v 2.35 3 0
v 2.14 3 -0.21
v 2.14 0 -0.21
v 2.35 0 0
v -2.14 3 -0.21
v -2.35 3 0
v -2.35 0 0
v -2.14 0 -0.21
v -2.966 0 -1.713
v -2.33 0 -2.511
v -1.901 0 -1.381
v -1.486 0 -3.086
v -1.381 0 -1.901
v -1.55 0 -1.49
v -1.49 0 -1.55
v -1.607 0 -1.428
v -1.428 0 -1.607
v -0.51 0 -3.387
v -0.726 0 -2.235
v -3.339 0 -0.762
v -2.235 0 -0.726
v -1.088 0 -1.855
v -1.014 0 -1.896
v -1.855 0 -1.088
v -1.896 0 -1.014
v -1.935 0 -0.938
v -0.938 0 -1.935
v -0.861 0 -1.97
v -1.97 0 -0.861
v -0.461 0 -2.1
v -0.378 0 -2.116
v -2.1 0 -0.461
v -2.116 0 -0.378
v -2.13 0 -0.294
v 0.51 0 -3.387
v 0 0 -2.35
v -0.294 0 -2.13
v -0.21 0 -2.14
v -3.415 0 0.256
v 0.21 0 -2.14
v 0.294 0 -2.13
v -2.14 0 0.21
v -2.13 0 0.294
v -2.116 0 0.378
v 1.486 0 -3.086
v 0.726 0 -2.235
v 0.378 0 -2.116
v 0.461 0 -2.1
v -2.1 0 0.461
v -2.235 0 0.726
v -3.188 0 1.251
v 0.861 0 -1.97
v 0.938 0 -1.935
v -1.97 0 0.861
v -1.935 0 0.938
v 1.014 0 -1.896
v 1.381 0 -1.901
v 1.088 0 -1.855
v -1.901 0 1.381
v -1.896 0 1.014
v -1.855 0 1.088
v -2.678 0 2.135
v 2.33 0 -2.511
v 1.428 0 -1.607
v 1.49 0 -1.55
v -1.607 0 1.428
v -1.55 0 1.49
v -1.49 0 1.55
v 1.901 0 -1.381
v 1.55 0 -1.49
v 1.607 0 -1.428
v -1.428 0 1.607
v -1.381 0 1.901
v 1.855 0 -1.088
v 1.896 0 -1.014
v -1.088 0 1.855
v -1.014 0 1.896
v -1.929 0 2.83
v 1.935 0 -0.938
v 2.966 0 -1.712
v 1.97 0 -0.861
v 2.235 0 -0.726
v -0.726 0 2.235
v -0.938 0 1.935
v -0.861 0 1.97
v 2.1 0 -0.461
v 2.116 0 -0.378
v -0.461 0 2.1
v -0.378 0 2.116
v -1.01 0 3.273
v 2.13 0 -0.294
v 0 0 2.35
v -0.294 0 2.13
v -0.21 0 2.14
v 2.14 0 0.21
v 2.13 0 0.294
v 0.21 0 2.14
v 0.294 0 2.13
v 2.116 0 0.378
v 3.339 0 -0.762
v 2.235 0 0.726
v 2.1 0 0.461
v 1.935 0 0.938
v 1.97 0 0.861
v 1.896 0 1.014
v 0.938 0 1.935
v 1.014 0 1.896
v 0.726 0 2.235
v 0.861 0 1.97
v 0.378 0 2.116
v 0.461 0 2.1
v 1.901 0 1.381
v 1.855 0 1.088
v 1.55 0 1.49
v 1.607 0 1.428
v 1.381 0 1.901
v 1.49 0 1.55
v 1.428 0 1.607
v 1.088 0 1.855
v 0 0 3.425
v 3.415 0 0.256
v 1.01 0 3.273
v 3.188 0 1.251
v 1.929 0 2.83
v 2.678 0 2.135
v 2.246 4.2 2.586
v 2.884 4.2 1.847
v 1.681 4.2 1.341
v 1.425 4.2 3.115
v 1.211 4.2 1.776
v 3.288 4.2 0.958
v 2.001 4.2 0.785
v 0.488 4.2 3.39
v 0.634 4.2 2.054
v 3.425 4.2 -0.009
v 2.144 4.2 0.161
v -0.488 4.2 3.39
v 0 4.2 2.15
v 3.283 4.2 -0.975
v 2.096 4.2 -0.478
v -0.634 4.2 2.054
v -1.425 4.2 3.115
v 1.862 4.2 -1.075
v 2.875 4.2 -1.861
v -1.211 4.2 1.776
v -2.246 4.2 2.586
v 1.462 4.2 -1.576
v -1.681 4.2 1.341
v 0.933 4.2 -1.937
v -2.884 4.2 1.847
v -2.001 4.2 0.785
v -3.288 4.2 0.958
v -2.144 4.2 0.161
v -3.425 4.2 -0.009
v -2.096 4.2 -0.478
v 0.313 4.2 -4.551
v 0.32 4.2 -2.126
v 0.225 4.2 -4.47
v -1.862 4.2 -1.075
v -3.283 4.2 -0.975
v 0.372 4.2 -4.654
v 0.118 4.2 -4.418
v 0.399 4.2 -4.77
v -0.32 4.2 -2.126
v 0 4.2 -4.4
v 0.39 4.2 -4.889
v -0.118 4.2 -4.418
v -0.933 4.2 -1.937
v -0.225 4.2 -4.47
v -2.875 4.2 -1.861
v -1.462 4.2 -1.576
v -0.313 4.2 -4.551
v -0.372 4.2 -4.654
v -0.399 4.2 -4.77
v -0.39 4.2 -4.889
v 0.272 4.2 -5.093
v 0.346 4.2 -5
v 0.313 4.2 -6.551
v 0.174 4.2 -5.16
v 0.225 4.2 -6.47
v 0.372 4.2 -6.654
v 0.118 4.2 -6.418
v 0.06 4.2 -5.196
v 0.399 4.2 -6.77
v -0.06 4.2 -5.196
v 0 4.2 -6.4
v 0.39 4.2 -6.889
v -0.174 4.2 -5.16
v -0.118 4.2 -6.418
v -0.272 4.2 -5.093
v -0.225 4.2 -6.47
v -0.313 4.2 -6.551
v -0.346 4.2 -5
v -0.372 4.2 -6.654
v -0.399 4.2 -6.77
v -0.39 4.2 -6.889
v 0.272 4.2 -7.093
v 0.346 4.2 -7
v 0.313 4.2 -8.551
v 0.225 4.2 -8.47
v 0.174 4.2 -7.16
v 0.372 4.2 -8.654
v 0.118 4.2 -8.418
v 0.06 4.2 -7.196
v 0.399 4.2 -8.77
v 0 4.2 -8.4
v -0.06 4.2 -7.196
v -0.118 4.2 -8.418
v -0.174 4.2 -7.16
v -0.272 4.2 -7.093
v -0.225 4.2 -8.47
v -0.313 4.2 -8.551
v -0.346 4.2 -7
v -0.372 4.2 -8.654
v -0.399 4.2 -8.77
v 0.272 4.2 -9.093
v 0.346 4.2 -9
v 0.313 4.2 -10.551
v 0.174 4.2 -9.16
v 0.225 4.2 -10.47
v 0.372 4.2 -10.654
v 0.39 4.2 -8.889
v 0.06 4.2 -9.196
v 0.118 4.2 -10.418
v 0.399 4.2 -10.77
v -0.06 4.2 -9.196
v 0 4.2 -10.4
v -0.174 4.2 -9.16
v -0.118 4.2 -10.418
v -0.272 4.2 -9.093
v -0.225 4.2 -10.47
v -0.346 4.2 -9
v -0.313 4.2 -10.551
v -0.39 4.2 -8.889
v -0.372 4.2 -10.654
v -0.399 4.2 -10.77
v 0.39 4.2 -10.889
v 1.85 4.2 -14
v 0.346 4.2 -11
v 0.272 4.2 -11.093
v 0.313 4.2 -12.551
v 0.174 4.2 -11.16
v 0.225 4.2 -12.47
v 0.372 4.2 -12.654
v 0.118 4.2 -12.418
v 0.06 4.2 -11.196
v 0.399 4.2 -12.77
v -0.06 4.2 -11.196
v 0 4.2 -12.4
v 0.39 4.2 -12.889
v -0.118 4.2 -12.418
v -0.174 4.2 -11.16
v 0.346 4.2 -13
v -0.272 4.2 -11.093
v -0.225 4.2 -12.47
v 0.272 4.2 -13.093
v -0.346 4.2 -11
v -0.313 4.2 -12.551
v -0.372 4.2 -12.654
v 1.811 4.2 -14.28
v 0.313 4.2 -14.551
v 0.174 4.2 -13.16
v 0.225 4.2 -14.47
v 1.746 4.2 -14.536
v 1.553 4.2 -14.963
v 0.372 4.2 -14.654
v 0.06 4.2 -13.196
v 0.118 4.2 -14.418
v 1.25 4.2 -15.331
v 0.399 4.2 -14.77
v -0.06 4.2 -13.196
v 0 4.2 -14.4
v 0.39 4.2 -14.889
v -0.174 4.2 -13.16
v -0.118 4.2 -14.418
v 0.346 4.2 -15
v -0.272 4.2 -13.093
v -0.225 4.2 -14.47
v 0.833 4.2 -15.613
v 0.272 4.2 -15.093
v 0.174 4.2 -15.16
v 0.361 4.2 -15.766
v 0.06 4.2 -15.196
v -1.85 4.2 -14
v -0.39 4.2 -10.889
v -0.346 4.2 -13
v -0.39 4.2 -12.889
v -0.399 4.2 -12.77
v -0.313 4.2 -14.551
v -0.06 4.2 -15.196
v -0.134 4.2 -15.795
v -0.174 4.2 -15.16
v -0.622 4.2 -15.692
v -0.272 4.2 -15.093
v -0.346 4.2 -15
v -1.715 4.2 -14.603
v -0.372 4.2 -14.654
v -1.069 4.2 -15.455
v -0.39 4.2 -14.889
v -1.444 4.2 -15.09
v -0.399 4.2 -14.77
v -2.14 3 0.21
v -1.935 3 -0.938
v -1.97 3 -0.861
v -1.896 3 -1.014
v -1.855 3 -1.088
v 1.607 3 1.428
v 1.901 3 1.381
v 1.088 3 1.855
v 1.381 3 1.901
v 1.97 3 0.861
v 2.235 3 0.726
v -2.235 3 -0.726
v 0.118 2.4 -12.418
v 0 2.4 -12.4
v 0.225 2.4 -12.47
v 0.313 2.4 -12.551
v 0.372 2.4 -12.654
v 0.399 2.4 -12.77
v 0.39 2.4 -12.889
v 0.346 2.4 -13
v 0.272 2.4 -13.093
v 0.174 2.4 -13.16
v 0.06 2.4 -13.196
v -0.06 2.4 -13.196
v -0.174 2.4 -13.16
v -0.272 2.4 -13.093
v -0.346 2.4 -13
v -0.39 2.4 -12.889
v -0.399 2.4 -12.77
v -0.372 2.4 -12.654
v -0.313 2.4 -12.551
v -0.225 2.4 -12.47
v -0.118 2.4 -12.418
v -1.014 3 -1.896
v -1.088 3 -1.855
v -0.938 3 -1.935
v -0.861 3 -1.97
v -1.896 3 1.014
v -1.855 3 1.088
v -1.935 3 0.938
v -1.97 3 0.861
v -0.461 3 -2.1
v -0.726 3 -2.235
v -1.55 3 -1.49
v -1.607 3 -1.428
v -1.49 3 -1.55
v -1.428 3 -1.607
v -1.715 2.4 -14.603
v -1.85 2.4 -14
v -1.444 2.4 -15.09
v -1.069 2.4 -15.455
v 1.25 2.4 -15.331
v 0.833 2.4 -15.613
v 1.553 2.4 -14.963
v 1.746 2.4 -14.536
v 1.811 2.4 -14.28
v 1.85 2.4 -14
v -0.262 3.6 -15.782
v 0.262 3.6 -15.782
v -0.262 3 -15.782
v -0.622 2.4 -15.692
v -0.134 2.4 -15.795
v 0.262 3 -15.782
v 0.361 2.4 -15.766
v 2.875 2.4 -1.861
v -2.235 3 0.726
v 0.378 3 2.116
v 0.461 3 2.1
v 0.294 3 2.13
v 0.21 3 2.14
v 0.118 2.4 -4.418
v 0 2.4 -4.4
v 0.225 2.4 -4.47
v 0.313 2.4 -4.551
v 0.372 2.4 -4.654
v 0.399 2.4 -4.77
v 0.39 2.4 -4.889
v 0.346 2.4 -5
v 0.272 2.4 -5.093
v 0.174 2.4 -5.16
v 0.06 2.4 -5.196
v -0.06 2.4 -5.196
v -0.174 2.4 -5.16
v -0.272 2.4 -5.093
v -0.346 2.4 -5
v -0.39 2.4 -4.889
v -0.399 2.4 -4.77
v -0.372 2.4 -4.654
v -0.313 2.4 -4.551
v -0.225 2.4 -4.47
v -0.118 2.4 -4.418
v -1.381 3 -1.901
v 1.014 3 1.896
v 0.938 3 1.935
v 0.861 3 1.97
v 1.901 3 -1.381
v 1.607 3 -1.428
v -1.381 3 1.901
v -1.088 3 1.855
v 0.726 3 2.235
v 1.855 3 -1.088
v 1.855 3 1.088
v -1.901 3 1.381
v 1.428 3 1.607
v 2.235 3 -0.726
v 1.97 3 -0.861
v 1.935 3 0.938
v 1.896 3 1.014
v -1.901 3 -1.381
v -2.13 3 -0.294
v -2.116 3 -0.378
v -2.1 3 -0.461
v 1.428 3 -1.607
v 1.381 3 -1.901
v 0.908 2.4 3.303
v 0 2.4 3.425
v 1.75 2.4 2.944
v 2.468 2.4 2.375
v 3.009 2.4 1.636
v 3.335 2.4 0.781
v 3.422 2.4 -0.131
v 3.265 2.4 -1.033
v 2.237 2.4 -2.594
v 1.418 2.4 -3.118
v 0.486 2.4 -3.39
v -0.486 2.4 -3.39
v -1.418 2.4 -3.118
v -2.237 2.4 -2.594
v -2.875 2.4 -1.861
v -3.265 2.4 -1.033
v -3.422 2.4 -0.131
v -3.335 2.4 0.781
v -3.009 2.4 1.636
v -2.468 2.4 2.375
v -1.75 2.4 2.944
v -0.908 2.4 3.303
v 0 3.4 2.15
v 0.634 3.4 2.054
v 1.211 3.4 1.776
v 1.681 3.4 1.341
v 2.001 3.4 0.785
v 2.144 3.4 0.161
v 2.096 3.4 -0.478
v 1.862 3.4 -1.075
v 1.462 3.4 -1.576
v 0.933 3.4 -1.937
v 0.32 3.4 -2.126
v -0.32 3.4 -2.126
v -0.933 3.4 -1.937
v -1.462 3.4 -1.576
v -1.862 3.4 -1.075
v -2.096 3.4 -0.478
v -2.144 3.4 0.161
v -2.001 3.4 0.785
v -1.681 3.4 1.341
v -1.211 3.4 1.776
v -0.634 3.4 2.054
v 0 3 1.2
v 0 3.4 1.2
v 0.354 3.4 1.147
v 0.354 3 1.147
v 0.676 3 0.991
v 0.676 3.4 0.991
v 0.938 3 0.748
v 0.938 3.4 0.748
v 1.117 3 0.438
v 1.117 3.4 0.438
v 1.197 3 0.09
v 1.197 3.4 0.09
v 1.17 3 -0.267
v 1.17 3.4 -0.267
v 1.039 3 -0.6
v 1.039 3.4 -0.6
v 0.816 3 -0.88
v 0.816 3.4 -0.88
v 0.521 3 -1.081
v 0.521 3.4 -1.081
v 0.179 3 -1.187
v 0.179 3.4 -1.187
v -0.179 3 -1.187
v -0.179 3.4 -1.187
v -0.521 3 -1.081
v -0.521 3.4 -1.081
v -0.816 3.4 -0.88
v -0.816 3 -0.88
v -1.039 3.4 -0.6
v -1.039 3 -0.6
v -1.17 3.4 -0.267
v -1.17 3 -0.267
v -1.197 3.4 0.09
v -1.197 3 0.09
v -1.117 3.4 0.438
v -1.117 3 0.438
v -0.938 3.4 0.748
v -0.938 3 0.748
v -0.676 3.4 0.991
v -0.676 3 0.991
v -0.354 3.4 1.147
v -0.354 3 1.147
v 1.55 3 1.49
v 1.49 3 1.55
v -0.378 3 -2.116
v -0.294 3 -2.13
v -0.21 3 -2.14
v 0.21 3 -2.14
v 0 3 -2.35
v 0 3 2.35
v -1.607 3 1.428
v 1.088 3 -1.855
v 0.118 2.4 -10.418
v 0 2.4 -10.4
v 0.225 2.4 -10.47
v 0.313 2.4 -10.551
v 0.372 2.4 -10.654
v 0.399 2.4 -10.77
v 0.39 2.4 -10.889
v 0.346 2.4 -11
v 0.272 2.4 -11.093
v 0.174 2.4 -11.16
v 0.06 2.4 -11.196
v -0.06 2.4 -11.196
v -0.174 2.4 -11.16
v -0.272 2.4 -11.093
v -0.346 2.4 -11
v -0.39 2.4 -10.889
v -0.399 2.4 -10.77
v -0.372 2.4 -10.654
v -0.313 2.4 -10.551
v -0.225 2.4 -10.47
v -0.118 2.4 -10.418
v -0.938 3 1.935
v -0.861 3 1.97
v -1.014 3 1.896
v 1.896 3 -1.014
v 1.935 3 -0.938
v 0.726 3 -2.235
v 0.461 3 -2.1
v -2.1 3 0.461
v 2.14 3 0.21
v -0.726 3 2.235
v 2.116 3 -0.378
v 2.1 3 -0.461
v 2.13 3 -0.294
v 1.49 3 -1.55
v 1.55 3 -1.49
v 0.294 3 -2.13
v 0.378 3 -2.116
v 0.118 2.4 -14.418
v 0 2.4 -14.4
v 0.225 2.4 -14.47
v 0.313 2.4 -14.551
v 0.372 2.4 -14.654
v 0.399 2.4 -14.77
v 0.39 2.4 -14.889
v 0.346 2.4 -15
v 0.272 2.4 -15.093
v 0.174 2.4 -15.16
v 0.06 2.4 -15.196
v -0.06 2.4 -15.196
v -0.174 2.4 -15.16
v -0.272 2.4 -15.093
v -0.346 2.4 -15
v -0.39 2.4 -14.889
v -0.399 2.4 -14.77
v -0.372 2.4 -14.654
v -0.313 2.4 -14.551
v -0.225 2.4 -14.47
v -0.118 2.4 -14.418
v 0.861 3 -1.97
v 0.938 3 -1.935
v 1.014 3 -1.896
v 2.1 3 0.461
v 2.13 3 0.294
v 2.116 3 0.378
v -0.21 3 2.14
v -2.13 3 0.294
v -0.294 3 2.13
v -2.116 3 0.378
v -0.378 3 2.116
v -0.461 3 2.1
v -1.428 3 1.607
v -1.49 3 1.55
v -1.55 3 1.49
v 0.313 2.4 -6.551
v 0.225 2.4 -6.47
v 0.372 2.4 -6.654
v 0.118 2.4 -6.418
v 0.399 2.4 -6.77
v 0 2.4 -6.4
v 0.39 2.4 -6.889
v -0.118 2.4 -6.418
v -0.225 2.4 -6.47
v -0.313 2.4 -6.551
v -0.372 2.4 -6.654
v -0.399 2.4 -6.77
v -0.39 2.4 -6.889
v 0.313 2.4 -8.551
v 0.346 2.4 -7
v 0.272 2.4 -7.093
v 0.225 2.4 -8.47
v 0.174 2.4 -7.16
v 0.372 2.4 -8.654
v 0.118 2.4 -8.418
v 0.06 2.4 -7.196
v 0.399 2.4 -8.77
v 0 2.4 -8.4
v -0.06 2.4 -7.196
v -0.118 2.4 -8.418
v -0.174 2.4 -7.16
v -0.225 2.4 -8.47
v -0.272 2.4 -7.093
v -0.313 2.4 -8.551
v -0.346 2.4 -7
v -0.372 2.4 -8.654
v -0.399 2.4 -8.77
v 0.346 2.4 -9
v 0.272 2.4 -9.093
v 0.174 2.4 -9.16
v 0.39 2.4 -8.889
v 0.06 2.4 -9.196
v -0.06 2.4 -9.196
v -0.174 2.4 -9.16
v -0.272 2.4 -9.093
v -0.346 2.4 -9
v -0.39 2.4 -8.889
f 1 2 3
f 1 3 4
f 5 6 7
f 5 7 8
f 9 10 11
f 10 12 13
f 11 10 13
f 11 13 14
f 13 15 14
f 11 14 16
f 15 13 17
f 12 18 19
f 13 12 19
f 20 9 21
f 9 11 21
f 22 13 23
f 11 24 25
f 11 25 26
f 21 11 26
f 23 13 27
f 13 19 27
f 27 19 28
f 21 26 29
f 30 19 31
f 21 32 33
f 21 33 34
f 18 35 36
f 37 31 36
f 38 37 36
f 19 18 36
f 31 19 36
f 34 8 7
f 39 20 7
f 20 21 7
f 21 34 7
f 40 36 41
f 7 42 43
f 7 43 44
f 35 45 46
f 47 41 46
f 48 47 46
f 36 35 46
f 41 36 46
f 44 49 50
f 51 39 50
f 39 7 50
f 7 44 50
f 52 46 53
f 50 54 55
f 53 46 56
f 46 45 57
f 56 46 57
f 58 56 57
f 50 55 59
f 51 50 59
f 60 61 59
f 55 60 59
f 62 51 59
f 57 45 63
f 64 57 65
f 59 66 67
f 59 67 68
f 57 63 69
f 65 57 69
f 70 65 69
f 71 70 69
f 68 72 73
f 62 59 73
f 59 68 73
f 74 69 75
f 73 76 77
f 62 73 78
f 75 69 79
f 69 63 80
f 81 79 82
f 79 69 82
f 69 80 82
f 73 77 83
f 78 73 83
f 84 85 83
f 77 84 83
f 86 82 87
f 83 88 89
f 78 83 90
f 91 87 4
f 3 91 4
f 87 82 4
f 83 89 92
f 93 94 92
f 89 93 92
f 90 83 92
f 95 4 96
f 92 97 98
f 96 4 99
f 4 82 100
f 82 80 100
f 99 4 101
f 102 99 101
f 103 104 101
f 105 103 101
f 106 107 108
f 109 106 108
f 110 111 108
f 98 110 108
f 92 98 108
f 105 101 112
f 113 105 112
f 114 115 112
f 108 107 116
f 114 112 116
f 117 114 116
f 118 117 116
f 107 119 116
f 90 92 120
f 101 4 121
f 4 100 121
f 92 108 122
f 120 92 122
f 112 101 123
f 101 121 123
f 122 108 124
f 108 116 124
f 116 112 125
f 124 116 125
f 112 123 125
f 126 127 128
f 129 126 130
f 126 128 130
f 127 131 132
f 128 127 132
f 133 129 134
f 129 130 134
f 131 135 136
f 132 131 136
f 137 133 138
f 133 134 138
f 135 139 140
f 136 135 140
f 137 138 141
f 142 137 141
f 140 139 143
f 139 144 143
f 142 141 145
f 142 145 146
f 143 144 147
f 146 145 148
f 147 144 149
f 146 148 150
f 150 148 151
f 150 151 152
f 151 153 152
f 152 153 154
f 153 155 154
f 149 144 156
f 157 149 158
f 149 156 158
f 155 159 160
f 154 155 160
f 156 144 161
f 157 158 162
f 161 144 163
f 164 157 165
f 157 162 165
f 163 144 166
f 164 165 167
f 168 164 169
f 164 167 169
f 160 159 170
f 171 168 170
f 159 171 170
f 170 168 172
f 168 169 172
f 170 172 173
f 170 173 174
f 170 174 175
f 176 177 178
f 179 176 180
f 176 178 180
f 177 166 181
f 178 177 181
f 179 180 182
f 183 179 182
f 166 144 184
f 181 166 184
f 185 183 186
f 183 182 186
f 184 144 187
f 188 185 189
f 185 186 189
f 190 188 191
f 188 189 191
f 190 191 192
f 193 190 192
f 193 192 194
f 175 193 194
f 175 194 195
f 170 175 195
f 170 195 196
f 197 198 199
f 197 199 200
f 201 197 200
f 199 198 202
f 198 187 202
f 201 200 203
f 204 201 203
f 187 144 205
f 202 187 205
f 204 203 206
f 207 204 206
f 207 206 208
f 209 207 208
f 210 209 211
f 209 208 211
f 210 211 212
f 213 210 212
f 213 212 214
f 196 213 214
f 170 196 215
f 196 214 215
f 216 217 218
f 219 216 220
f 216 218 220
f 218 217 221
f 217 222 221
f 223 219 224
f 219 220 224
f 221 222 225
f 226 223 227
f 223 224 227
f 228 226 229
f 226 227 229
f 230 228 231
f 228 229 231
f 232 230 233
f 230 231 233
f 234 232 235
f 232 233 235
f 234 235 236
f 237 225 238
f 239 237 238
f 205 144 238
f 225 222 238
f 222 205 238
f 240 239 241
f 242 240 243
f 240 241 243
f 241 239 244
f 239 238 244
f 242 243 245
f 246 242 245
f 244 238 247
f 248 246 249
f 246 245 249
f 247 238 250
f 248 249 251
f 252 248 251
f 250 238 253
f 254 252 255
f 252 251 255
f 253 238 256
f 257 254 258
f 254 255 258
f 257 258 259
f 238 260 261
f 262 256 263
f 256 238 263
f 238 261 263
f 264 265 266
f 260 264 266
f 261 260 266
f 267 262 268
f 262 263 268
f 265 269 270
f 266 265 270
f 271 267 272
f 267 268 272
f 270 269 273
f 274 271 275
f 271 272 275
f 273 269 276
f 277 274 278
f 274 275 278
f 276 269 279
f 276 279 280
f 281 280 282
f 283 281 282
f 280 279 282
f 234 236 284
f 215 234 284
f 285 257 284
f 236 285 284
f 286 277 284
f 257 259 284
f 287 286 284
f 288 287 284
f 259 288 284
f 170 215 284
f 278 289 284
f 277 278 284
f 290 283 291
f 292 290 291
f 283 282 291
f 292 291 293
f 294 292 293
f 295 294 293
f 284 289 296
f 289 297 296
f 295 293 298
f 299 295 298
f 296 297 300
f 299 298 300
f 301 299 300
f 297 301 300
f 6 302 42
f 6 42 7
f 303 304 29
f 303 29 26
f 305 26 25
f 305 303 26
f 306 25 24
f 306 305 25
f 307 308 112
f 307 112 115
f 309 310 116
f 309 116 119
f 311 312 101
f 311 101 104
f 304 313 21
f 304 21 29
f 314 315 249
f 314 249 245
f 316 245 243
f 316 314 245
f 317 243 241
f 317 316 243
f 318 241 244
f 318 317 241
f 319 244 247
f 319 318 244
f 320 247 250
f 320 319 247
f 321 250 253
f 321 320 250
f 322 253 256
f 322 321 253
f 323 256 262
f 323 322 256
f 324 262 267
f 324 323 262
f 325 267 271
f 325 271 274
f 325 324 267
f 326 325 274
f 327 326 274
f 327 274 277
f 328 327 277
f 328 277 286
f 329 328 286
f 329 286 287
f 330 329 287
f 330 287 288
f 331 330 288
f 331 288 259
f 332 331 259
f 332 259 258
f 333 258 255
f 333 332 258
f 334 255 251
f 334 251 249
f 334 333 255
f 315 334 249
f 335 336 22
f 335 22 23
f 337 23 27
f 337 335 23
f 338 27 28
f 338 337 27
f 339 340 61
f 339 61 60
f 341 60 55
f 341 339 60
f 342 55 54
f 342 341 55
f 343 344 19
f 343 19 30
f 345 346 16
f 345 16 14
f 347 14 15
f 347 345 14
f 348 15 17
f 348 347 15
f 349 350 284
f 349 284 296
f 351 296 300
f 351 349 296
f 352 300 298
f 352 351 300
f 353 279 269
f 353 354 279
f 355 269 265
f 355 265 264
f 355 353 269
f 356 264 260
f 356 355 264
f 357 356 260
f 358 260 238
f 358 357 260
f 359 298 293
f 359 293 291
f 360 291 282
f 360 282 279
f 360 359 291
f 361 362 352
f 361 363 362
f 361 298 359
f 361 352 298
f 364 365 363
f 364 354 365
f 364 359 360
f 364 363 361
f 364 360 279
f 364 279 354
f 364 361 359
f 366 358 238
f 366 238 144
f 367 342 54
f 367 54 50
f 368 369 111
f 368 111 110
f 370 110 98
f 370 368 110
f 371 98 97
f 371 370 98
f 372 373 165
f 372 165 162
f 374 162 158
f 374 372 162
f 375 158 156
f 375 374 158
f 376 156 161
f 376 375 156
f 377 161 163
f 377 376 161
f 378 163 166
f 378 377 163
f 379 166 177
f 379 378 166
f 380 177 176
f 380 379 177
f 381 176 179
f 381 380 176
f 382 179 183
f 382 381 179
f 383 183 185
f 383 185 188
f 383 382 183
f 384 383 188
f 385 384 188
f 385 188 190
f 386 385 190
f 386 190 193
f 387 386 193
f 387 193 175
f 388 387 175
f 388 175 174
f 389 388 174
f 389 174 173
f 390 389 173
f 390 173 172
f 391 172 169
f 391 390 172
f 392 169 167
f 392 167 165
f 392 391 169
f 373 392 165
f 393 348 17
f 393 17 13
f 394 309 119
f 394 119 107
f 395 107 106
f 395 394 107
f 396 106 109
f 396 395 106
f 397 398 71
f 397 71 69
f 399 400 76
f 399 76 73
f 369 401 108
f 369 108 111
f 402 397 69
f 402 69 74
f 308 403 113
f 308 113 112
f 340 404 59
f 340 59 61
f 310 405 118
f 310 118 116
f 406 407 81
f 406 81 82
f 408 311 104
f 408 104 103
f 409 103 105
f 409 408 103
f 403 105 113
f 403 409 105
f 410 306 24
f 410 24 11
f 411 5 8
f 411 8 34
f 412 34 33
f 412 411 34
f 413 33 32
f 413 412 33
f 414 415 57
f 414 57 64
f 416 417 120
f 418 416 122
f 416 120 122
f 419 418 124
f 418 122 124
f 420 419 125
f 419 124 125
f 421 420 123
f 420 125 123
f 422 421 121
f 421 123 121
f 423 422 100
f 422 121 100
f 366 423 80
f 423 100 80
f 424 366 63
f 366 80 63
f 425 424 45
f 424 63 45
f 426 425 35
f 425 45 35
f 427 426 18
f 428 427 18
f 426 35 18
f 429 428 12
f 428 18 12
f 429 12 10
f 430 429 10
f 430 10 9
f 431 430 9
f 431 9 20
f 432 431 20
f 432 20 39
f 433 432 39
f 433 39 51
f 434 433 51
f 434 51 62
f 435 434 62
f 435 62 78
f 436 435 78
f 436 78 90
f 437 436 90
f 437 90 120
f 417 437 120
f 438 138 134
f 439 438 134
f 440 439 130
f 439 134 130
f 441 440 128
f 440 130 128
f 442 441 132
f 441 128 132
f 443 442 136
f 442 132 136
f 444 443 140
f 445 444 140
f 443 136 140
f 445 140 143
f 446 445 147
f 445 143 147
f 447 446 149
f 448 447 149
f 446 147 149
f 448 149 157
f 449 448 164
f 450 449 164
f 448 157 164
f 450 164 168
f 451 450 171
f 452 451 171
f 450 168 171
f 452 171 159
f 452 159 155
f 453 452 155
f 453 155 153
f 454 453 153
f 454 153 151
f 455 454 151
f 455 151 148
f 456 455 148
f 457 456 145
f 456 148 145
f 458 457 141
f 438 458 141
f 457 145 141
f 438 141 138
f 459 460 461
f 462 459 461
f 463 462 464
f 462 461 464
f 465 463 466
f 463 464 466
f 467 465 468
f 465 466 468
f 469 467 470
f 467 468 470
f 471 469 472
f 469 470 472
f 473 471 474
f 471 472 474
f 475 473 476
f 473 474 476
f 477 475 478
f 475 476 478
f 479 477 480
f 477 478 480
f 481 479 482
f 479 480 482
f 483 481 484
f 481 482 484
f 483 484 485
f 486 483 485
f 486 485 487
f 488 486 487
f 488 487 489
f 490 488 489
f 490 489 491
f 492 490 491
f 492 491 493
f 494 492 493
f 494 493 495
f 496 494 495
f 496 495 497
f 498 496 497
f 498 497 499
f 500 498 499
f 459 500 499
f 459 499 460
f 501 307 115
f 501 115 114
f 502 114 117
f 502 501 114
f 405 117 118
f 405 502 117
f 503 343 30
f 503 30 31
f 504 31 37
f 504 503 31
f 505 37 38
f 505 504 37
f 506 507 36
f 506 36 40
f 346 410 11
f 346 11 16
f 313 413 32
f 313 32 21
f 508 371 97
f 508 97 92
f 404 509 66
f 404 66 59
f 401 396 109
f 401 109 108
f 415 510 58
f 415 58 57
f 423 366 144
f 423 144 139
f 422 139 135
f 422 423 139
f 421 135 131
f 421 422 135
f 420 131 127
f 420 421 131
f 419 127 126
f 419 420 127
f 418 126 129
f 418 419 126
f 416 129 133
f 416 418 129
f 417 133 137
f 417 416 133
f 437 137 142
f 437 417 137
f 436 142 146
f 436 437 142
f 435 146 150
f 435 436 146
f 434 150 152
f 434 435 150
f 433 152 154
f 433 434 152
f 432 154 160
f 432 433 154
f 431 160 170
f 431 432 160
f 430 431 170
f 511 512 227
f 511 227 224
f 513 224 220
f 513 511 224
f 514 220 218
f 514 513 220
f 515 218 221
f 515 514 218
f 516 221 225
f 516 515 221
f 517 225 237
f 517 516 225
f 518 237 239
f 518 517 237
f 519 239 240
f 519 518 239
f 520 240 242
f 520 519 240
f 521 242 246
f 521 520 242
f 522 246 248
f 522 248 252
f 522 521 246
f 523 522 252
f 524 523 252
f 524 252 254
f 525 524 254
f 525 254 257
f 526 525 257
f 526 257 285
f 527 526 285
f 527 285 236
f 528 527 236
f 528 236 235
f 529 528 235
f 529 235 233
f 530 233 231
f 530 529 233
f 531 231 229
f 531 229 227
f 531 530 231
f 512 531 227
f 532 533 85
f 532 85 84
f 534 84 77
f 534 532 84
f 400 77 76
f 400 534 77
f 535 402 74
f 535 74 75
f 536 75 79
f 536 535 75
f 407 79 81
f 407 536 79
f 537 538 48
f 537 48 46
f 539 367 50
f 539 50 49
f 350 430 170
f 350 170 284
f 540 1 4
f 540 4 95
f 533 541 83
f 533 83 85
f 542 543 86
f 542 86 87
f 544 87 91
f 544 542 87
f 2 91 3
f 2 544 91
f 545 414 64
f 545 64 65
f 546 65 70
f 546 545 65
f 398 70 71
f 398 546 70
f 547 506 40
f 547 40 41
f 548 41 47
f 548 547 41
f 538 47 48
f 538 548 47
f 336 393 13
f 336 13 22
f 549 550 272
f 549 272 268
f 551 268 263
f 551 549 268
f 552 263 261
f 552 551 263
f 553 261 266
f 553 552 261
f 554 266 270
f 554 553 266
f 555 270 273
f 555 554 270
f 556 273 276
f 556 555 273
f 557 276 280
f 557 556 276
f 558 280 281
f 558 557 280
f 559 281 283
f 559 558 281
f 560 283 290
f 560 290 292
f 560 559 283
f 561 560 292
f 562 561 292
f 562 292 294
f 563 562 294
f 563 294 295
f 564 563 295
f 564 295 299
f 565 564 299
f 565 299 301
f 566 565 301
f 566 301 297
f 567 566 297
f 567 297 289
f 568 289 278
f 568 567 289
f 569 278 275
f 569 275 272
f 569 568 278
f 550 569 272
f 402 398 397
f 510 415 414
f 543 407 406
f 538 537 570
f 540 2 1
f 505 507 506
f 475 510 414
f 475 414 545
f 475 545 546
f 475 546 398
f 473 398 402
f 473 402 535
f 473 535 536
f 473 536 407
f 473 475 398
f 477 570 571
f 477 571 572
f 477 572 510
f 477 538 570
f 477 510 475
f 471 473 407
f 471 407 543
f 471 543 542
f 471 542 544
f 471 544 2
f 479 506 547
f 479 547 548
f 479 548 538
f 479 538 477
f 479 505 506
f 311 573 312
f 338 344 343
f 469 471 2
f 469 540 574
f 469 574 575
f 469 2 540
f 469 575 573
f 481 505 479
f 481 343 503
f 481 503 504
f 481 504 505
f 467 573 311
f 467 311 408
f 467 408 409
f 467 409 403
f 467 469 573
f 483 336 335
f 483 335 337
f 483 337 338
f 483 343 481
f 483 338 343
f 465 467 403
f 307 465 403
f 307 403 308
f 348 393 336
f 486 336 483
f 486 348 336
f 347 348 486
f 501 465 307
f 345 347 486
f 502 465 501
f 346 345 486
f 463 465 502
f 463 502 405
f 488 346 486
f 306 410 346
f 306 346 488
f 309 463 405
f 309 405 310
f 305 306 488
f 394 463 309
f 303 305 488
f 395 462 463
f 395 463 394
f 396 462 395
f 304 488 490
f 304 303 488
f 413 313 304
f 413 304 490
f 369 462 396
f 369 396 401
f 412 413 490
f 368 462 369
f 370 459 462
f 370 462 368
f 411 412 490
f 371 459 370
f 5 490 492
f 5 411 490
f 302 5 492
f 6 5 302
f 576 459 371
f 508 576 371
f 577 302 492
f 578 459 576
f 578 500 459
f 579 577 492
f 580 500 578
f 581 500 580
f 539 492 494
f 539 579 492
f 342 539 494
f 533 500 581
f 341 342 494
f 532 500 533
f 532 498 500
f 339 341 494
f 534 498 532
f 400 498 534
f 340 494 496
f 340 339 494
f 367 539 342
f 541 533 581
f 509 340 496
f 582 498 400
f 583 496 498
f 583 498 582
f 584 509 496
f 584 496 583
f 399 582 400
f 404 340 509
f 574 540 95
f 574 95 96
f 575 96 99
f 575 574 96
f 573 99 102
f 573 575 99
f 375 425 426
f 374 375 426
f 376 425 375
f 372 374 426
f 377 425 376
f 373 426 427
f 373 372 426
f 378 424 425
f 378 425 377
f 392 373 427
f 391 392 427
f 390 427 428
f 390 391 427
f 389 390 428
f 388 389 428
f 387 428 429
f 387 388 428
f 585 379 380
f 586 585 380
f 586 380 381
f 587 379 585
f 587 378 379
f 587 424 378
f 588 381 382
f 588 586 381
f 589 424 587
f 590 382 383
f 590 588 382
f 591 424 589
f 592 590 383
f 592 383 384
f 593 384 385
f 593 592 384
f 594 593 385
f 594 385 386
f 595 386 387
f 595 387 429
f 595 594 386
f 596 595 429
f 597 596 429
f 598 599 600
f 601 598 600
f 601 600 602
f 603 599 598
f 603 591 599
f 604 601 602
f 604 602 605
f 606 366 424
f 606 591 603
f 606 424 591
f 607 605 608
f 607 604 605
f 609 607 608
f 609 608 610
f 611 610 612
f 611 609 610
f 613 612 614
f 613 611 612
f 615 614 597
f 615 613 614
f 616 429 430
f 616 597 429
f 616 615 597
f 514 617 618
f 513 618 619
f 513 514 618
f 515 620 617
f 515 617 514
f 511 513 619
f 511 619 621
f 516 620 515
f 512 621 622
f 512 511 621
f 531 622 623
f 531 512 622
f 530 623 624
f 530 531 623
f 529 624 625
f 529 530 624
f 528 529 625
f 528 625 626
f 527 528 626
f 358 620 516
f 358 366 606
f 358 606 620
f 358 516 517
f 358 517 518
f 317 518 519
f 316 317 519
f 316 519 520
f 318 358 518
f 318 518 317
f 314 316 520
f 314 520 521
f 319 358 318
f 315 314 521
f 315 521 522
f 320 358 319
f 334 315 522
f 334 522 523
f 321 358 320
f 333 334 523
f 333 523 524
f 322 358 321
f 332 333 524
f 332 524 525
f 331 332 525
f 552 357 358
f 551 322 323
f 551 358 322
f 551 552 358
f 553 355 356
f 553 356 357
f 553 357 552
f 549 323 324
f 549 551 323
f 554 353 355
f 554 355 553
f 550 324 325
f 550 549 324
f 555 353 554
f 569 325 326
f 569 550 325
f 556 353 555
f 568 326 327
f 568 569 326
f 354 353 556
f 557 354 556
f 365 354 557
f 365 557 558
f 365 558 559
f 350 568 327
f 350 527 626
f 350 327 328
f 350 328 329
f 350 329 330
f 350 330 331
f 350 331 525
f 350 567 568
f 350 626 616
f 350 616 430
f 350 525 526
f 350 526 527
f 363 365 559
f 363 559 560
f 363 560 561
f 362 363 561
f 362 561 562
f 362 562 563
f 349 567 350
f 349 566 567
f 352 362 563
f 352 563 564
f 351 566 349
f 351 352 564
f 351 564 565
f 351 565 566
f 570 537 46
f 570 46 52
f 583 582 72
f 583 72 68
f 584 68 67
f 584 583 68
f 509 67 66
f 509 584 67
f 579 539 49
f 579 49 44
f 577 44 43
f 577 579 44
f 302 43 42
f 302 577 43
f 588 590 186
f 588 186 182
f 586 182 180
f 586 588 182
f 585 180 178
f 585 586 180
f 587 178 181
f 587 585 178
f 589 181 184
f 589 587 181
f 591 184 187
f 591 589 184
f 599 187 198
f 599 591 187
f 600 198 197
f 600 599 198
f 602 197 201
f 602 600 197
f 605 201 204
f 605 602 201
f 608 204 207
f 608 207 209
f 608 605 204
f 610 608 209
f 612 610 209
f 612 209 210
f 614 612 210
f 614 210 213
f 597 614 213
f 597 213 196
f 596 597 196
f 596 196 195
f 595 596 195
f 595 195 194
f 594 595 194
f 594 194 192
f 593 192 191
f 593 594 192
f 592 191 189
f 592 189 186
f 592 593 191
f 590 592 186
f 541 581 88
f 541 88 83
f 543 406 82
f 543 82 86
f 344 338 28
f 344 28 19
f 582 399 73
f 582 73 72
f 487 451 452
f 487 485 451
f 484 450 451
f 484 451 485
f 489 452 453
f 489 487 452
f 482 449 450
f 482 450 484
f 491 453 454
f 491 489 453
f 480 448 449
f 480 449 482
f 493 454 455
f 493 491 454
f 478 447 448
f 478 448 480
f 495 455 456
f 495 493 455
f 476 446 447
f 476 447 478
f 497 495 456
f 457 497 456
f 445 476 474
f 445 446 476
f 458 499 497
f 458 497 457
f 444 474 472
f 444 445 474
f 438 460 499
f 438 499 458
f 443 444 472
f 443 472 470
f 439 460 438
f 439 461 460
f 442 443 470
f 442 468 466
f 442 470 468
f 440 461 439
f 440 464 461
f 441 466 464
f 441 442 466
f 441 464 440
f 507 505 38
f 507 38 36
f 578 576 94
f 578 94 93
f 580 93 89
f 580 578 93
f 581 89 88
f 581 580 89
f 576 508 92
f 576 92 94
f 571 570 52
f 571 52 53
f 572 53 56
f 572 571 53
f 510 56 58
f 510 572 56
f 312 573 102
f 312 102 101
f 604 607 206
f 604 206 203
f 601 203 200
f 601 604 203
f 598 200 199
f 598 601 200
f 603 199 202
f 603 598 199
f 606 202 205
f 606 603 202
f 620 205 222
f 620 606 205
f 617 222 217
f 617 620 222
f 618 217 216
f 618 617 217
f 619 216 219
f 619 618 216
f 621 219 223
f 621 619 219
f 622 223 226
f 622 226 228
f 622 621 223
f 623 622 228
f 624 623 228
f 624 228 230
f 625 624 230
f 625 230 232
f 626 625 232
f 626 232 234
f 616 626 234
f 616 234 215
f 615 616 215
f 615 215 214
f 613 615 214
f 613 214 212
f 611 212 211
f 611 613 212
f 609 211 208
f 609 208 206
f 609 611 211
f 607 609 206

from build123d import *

# Parameters (mm, degrees)
SKETCH1_R           = 3.425
HUB_DEPTH           = 2.4
SKETCH2_R           = 0.4
BOSS_EXTRUDE2_DEPTH = 1.8
SKETCH3_R           = 2.15
CUT_EXTRUDE1_DEPTH  = 0.8
SKETCH4_R           = 1.2
CUT_EXTRUDE2_DEPTH  = 17.520612
CUT_EXTRUDE3_START  = -3
CUT_EXTRUDE3_DEPTH  = 3
CIRPATTERN1_COUNT   = 20
CUT_EXTRUDE4_START  = -3
SKETCH6_R           = 2.15
CUT_EXTRUDE4_DEPTH  = 3


with BuildPart() as part:
    # Sketch1 → HUB (new body)
    with BuildSketch(Plane(origin=(0, 0, 0), x_dir=(1, 0, 0), z_dir=(0, 1, 0))):
        with Locations(Location((0, 0, 0), (0, 0, 270))):
            Circle(SKETCH1_R)
    extrude(amount=HUB_DEPTH)

    # Sketch2 → Boss-Extrude2 (add)
    with BuildSketch(Plane(origin=(0, 2.4, 0), x_dir=(1, 0, 0), z_dir=(0, 1, 0))):
        with BuildLine():
            Line((-2.875, 1.861451), (-1.85, 14))
            add(Edge.make_bspline(
                [(-1.85, 14), (-1.761904, 15.043277), (-0.882336, 15.809649), (0.882387, 15.802355), (1.755744, 15.11622), (1.85, 14)],
                knots=[0, 0, 0, 0, 0.45, 0.55, 1, 1, 1, 1], degree=3))
            Line((1.85, 14), (2.875, 1.861451))
            ThreePointArc((2.875, 1.861451), (0, -3.425), (-2.875, 1.861451))
        make_face()
        with Locations(Location((0, 14.8, 0), (0, 0, 270))):
            Circle(SKETCH2_R, mode=Mode.SUBTRACT)
        with Locations(Location((0, 12.8, 0), (0, 0, 270))):
            Circle(SKETCH2_R, mode=Mode.SUBTRACT)
        with Locations(Location((0, 10.8, 0), (0, 0, 270))):
            Circle(SKETCH2_R, mode=Mode.SUBTRACT)
        with Locations(Location((0, 8.8, 0), (0, 0, 270))):
            Circle(SKETCH2_R, mode=Mode.SUBTRACT)
        with Locations(Location((0, 6.8, 0), (0, 0, 270))):
            Circle(SKETCH2_R, mode=Mode.SUBTRACT)
        with Locations(Location((0, 4.8, 0), (0, 0, 270))):
            Circle(SKETCH2_R, mode=Mode.SUBTRACT)
    extrude(amount=BOSS_EXTRUDE2_DEPTH)

    # Sketch3 → Cut-Extrude1 (cut)
    with BuildSketch(Plane(origin=(0, 4.2, 0), x_dir=(1, 0, 0), z_dir=(0, 1, 0))):
        with Locations(Location((0, 0, 0), (0, 0, 270))):
            Circle(SKETCH3_R)
    extrude(amount=-CUT_EXTRUDE1_DEPTH, mode=Mode.SUBTRACT)

    # Sketch4 → Cut-Extrude2 (cut, through all)
    with BuildSketch(Plane(origin=(0, 3.4, 0), x_dir=(1, 0, 0), z_dir=(0, 1, 0))):
        with Locations(Location((0, 0, 0), (0, 0, 270))):
            Circle(SKETCH4_R)
    extrude(amount=-CUT_EXTRUDE2_DEPTH, mode=Mode.SUBTRACT)

    # Sketch5 → Cut-Extrude3 (cut)
    with BuildSketch(Plane.XZ.offset(CUT_EXTRUDE3_START)):
        with BuildLine():
            Line((0, 2.35), (-0.210311, 2.139689))
            ThreePointArc((-0.210311, 2.139689), (0, 2.15), (0.210311, 2.139689))
            Line((0.210311, 2.139689), (0, 2.35))
        make_face()
    cut_extrude3 = extrude(amount=CUT_EXTRUDE3_DEPTH, mode=Mode.SUBTRACT)

    # CirPattern1: Cut-Extrude3 ×20 about axis
    cirpattern1_axis = Axis((0, 0, 0), (0, 1, 0))
    for i in range(1, CIRPATTERN1_COUNT):
        add(cut_extrude3.rotate(cirpattern1_axis, i * 360 / CIRPATTERN1_COUNT), mode=Mode.SUBTRACT)

    # Sketch6 → Cut-Extrude4 (cut)
    with BuildSketch(Plane.XZ.offset(CUT_EXTRUDE4_START)):
        with Locations(Location((0, 0, 0), (0, 0, 90))):
            Circle(SKETCH6_R)
    extrude(amount=CUT_EXTRUDE4_DEPTH, mode=Mode.SUBTRACT)


solid = part.part
